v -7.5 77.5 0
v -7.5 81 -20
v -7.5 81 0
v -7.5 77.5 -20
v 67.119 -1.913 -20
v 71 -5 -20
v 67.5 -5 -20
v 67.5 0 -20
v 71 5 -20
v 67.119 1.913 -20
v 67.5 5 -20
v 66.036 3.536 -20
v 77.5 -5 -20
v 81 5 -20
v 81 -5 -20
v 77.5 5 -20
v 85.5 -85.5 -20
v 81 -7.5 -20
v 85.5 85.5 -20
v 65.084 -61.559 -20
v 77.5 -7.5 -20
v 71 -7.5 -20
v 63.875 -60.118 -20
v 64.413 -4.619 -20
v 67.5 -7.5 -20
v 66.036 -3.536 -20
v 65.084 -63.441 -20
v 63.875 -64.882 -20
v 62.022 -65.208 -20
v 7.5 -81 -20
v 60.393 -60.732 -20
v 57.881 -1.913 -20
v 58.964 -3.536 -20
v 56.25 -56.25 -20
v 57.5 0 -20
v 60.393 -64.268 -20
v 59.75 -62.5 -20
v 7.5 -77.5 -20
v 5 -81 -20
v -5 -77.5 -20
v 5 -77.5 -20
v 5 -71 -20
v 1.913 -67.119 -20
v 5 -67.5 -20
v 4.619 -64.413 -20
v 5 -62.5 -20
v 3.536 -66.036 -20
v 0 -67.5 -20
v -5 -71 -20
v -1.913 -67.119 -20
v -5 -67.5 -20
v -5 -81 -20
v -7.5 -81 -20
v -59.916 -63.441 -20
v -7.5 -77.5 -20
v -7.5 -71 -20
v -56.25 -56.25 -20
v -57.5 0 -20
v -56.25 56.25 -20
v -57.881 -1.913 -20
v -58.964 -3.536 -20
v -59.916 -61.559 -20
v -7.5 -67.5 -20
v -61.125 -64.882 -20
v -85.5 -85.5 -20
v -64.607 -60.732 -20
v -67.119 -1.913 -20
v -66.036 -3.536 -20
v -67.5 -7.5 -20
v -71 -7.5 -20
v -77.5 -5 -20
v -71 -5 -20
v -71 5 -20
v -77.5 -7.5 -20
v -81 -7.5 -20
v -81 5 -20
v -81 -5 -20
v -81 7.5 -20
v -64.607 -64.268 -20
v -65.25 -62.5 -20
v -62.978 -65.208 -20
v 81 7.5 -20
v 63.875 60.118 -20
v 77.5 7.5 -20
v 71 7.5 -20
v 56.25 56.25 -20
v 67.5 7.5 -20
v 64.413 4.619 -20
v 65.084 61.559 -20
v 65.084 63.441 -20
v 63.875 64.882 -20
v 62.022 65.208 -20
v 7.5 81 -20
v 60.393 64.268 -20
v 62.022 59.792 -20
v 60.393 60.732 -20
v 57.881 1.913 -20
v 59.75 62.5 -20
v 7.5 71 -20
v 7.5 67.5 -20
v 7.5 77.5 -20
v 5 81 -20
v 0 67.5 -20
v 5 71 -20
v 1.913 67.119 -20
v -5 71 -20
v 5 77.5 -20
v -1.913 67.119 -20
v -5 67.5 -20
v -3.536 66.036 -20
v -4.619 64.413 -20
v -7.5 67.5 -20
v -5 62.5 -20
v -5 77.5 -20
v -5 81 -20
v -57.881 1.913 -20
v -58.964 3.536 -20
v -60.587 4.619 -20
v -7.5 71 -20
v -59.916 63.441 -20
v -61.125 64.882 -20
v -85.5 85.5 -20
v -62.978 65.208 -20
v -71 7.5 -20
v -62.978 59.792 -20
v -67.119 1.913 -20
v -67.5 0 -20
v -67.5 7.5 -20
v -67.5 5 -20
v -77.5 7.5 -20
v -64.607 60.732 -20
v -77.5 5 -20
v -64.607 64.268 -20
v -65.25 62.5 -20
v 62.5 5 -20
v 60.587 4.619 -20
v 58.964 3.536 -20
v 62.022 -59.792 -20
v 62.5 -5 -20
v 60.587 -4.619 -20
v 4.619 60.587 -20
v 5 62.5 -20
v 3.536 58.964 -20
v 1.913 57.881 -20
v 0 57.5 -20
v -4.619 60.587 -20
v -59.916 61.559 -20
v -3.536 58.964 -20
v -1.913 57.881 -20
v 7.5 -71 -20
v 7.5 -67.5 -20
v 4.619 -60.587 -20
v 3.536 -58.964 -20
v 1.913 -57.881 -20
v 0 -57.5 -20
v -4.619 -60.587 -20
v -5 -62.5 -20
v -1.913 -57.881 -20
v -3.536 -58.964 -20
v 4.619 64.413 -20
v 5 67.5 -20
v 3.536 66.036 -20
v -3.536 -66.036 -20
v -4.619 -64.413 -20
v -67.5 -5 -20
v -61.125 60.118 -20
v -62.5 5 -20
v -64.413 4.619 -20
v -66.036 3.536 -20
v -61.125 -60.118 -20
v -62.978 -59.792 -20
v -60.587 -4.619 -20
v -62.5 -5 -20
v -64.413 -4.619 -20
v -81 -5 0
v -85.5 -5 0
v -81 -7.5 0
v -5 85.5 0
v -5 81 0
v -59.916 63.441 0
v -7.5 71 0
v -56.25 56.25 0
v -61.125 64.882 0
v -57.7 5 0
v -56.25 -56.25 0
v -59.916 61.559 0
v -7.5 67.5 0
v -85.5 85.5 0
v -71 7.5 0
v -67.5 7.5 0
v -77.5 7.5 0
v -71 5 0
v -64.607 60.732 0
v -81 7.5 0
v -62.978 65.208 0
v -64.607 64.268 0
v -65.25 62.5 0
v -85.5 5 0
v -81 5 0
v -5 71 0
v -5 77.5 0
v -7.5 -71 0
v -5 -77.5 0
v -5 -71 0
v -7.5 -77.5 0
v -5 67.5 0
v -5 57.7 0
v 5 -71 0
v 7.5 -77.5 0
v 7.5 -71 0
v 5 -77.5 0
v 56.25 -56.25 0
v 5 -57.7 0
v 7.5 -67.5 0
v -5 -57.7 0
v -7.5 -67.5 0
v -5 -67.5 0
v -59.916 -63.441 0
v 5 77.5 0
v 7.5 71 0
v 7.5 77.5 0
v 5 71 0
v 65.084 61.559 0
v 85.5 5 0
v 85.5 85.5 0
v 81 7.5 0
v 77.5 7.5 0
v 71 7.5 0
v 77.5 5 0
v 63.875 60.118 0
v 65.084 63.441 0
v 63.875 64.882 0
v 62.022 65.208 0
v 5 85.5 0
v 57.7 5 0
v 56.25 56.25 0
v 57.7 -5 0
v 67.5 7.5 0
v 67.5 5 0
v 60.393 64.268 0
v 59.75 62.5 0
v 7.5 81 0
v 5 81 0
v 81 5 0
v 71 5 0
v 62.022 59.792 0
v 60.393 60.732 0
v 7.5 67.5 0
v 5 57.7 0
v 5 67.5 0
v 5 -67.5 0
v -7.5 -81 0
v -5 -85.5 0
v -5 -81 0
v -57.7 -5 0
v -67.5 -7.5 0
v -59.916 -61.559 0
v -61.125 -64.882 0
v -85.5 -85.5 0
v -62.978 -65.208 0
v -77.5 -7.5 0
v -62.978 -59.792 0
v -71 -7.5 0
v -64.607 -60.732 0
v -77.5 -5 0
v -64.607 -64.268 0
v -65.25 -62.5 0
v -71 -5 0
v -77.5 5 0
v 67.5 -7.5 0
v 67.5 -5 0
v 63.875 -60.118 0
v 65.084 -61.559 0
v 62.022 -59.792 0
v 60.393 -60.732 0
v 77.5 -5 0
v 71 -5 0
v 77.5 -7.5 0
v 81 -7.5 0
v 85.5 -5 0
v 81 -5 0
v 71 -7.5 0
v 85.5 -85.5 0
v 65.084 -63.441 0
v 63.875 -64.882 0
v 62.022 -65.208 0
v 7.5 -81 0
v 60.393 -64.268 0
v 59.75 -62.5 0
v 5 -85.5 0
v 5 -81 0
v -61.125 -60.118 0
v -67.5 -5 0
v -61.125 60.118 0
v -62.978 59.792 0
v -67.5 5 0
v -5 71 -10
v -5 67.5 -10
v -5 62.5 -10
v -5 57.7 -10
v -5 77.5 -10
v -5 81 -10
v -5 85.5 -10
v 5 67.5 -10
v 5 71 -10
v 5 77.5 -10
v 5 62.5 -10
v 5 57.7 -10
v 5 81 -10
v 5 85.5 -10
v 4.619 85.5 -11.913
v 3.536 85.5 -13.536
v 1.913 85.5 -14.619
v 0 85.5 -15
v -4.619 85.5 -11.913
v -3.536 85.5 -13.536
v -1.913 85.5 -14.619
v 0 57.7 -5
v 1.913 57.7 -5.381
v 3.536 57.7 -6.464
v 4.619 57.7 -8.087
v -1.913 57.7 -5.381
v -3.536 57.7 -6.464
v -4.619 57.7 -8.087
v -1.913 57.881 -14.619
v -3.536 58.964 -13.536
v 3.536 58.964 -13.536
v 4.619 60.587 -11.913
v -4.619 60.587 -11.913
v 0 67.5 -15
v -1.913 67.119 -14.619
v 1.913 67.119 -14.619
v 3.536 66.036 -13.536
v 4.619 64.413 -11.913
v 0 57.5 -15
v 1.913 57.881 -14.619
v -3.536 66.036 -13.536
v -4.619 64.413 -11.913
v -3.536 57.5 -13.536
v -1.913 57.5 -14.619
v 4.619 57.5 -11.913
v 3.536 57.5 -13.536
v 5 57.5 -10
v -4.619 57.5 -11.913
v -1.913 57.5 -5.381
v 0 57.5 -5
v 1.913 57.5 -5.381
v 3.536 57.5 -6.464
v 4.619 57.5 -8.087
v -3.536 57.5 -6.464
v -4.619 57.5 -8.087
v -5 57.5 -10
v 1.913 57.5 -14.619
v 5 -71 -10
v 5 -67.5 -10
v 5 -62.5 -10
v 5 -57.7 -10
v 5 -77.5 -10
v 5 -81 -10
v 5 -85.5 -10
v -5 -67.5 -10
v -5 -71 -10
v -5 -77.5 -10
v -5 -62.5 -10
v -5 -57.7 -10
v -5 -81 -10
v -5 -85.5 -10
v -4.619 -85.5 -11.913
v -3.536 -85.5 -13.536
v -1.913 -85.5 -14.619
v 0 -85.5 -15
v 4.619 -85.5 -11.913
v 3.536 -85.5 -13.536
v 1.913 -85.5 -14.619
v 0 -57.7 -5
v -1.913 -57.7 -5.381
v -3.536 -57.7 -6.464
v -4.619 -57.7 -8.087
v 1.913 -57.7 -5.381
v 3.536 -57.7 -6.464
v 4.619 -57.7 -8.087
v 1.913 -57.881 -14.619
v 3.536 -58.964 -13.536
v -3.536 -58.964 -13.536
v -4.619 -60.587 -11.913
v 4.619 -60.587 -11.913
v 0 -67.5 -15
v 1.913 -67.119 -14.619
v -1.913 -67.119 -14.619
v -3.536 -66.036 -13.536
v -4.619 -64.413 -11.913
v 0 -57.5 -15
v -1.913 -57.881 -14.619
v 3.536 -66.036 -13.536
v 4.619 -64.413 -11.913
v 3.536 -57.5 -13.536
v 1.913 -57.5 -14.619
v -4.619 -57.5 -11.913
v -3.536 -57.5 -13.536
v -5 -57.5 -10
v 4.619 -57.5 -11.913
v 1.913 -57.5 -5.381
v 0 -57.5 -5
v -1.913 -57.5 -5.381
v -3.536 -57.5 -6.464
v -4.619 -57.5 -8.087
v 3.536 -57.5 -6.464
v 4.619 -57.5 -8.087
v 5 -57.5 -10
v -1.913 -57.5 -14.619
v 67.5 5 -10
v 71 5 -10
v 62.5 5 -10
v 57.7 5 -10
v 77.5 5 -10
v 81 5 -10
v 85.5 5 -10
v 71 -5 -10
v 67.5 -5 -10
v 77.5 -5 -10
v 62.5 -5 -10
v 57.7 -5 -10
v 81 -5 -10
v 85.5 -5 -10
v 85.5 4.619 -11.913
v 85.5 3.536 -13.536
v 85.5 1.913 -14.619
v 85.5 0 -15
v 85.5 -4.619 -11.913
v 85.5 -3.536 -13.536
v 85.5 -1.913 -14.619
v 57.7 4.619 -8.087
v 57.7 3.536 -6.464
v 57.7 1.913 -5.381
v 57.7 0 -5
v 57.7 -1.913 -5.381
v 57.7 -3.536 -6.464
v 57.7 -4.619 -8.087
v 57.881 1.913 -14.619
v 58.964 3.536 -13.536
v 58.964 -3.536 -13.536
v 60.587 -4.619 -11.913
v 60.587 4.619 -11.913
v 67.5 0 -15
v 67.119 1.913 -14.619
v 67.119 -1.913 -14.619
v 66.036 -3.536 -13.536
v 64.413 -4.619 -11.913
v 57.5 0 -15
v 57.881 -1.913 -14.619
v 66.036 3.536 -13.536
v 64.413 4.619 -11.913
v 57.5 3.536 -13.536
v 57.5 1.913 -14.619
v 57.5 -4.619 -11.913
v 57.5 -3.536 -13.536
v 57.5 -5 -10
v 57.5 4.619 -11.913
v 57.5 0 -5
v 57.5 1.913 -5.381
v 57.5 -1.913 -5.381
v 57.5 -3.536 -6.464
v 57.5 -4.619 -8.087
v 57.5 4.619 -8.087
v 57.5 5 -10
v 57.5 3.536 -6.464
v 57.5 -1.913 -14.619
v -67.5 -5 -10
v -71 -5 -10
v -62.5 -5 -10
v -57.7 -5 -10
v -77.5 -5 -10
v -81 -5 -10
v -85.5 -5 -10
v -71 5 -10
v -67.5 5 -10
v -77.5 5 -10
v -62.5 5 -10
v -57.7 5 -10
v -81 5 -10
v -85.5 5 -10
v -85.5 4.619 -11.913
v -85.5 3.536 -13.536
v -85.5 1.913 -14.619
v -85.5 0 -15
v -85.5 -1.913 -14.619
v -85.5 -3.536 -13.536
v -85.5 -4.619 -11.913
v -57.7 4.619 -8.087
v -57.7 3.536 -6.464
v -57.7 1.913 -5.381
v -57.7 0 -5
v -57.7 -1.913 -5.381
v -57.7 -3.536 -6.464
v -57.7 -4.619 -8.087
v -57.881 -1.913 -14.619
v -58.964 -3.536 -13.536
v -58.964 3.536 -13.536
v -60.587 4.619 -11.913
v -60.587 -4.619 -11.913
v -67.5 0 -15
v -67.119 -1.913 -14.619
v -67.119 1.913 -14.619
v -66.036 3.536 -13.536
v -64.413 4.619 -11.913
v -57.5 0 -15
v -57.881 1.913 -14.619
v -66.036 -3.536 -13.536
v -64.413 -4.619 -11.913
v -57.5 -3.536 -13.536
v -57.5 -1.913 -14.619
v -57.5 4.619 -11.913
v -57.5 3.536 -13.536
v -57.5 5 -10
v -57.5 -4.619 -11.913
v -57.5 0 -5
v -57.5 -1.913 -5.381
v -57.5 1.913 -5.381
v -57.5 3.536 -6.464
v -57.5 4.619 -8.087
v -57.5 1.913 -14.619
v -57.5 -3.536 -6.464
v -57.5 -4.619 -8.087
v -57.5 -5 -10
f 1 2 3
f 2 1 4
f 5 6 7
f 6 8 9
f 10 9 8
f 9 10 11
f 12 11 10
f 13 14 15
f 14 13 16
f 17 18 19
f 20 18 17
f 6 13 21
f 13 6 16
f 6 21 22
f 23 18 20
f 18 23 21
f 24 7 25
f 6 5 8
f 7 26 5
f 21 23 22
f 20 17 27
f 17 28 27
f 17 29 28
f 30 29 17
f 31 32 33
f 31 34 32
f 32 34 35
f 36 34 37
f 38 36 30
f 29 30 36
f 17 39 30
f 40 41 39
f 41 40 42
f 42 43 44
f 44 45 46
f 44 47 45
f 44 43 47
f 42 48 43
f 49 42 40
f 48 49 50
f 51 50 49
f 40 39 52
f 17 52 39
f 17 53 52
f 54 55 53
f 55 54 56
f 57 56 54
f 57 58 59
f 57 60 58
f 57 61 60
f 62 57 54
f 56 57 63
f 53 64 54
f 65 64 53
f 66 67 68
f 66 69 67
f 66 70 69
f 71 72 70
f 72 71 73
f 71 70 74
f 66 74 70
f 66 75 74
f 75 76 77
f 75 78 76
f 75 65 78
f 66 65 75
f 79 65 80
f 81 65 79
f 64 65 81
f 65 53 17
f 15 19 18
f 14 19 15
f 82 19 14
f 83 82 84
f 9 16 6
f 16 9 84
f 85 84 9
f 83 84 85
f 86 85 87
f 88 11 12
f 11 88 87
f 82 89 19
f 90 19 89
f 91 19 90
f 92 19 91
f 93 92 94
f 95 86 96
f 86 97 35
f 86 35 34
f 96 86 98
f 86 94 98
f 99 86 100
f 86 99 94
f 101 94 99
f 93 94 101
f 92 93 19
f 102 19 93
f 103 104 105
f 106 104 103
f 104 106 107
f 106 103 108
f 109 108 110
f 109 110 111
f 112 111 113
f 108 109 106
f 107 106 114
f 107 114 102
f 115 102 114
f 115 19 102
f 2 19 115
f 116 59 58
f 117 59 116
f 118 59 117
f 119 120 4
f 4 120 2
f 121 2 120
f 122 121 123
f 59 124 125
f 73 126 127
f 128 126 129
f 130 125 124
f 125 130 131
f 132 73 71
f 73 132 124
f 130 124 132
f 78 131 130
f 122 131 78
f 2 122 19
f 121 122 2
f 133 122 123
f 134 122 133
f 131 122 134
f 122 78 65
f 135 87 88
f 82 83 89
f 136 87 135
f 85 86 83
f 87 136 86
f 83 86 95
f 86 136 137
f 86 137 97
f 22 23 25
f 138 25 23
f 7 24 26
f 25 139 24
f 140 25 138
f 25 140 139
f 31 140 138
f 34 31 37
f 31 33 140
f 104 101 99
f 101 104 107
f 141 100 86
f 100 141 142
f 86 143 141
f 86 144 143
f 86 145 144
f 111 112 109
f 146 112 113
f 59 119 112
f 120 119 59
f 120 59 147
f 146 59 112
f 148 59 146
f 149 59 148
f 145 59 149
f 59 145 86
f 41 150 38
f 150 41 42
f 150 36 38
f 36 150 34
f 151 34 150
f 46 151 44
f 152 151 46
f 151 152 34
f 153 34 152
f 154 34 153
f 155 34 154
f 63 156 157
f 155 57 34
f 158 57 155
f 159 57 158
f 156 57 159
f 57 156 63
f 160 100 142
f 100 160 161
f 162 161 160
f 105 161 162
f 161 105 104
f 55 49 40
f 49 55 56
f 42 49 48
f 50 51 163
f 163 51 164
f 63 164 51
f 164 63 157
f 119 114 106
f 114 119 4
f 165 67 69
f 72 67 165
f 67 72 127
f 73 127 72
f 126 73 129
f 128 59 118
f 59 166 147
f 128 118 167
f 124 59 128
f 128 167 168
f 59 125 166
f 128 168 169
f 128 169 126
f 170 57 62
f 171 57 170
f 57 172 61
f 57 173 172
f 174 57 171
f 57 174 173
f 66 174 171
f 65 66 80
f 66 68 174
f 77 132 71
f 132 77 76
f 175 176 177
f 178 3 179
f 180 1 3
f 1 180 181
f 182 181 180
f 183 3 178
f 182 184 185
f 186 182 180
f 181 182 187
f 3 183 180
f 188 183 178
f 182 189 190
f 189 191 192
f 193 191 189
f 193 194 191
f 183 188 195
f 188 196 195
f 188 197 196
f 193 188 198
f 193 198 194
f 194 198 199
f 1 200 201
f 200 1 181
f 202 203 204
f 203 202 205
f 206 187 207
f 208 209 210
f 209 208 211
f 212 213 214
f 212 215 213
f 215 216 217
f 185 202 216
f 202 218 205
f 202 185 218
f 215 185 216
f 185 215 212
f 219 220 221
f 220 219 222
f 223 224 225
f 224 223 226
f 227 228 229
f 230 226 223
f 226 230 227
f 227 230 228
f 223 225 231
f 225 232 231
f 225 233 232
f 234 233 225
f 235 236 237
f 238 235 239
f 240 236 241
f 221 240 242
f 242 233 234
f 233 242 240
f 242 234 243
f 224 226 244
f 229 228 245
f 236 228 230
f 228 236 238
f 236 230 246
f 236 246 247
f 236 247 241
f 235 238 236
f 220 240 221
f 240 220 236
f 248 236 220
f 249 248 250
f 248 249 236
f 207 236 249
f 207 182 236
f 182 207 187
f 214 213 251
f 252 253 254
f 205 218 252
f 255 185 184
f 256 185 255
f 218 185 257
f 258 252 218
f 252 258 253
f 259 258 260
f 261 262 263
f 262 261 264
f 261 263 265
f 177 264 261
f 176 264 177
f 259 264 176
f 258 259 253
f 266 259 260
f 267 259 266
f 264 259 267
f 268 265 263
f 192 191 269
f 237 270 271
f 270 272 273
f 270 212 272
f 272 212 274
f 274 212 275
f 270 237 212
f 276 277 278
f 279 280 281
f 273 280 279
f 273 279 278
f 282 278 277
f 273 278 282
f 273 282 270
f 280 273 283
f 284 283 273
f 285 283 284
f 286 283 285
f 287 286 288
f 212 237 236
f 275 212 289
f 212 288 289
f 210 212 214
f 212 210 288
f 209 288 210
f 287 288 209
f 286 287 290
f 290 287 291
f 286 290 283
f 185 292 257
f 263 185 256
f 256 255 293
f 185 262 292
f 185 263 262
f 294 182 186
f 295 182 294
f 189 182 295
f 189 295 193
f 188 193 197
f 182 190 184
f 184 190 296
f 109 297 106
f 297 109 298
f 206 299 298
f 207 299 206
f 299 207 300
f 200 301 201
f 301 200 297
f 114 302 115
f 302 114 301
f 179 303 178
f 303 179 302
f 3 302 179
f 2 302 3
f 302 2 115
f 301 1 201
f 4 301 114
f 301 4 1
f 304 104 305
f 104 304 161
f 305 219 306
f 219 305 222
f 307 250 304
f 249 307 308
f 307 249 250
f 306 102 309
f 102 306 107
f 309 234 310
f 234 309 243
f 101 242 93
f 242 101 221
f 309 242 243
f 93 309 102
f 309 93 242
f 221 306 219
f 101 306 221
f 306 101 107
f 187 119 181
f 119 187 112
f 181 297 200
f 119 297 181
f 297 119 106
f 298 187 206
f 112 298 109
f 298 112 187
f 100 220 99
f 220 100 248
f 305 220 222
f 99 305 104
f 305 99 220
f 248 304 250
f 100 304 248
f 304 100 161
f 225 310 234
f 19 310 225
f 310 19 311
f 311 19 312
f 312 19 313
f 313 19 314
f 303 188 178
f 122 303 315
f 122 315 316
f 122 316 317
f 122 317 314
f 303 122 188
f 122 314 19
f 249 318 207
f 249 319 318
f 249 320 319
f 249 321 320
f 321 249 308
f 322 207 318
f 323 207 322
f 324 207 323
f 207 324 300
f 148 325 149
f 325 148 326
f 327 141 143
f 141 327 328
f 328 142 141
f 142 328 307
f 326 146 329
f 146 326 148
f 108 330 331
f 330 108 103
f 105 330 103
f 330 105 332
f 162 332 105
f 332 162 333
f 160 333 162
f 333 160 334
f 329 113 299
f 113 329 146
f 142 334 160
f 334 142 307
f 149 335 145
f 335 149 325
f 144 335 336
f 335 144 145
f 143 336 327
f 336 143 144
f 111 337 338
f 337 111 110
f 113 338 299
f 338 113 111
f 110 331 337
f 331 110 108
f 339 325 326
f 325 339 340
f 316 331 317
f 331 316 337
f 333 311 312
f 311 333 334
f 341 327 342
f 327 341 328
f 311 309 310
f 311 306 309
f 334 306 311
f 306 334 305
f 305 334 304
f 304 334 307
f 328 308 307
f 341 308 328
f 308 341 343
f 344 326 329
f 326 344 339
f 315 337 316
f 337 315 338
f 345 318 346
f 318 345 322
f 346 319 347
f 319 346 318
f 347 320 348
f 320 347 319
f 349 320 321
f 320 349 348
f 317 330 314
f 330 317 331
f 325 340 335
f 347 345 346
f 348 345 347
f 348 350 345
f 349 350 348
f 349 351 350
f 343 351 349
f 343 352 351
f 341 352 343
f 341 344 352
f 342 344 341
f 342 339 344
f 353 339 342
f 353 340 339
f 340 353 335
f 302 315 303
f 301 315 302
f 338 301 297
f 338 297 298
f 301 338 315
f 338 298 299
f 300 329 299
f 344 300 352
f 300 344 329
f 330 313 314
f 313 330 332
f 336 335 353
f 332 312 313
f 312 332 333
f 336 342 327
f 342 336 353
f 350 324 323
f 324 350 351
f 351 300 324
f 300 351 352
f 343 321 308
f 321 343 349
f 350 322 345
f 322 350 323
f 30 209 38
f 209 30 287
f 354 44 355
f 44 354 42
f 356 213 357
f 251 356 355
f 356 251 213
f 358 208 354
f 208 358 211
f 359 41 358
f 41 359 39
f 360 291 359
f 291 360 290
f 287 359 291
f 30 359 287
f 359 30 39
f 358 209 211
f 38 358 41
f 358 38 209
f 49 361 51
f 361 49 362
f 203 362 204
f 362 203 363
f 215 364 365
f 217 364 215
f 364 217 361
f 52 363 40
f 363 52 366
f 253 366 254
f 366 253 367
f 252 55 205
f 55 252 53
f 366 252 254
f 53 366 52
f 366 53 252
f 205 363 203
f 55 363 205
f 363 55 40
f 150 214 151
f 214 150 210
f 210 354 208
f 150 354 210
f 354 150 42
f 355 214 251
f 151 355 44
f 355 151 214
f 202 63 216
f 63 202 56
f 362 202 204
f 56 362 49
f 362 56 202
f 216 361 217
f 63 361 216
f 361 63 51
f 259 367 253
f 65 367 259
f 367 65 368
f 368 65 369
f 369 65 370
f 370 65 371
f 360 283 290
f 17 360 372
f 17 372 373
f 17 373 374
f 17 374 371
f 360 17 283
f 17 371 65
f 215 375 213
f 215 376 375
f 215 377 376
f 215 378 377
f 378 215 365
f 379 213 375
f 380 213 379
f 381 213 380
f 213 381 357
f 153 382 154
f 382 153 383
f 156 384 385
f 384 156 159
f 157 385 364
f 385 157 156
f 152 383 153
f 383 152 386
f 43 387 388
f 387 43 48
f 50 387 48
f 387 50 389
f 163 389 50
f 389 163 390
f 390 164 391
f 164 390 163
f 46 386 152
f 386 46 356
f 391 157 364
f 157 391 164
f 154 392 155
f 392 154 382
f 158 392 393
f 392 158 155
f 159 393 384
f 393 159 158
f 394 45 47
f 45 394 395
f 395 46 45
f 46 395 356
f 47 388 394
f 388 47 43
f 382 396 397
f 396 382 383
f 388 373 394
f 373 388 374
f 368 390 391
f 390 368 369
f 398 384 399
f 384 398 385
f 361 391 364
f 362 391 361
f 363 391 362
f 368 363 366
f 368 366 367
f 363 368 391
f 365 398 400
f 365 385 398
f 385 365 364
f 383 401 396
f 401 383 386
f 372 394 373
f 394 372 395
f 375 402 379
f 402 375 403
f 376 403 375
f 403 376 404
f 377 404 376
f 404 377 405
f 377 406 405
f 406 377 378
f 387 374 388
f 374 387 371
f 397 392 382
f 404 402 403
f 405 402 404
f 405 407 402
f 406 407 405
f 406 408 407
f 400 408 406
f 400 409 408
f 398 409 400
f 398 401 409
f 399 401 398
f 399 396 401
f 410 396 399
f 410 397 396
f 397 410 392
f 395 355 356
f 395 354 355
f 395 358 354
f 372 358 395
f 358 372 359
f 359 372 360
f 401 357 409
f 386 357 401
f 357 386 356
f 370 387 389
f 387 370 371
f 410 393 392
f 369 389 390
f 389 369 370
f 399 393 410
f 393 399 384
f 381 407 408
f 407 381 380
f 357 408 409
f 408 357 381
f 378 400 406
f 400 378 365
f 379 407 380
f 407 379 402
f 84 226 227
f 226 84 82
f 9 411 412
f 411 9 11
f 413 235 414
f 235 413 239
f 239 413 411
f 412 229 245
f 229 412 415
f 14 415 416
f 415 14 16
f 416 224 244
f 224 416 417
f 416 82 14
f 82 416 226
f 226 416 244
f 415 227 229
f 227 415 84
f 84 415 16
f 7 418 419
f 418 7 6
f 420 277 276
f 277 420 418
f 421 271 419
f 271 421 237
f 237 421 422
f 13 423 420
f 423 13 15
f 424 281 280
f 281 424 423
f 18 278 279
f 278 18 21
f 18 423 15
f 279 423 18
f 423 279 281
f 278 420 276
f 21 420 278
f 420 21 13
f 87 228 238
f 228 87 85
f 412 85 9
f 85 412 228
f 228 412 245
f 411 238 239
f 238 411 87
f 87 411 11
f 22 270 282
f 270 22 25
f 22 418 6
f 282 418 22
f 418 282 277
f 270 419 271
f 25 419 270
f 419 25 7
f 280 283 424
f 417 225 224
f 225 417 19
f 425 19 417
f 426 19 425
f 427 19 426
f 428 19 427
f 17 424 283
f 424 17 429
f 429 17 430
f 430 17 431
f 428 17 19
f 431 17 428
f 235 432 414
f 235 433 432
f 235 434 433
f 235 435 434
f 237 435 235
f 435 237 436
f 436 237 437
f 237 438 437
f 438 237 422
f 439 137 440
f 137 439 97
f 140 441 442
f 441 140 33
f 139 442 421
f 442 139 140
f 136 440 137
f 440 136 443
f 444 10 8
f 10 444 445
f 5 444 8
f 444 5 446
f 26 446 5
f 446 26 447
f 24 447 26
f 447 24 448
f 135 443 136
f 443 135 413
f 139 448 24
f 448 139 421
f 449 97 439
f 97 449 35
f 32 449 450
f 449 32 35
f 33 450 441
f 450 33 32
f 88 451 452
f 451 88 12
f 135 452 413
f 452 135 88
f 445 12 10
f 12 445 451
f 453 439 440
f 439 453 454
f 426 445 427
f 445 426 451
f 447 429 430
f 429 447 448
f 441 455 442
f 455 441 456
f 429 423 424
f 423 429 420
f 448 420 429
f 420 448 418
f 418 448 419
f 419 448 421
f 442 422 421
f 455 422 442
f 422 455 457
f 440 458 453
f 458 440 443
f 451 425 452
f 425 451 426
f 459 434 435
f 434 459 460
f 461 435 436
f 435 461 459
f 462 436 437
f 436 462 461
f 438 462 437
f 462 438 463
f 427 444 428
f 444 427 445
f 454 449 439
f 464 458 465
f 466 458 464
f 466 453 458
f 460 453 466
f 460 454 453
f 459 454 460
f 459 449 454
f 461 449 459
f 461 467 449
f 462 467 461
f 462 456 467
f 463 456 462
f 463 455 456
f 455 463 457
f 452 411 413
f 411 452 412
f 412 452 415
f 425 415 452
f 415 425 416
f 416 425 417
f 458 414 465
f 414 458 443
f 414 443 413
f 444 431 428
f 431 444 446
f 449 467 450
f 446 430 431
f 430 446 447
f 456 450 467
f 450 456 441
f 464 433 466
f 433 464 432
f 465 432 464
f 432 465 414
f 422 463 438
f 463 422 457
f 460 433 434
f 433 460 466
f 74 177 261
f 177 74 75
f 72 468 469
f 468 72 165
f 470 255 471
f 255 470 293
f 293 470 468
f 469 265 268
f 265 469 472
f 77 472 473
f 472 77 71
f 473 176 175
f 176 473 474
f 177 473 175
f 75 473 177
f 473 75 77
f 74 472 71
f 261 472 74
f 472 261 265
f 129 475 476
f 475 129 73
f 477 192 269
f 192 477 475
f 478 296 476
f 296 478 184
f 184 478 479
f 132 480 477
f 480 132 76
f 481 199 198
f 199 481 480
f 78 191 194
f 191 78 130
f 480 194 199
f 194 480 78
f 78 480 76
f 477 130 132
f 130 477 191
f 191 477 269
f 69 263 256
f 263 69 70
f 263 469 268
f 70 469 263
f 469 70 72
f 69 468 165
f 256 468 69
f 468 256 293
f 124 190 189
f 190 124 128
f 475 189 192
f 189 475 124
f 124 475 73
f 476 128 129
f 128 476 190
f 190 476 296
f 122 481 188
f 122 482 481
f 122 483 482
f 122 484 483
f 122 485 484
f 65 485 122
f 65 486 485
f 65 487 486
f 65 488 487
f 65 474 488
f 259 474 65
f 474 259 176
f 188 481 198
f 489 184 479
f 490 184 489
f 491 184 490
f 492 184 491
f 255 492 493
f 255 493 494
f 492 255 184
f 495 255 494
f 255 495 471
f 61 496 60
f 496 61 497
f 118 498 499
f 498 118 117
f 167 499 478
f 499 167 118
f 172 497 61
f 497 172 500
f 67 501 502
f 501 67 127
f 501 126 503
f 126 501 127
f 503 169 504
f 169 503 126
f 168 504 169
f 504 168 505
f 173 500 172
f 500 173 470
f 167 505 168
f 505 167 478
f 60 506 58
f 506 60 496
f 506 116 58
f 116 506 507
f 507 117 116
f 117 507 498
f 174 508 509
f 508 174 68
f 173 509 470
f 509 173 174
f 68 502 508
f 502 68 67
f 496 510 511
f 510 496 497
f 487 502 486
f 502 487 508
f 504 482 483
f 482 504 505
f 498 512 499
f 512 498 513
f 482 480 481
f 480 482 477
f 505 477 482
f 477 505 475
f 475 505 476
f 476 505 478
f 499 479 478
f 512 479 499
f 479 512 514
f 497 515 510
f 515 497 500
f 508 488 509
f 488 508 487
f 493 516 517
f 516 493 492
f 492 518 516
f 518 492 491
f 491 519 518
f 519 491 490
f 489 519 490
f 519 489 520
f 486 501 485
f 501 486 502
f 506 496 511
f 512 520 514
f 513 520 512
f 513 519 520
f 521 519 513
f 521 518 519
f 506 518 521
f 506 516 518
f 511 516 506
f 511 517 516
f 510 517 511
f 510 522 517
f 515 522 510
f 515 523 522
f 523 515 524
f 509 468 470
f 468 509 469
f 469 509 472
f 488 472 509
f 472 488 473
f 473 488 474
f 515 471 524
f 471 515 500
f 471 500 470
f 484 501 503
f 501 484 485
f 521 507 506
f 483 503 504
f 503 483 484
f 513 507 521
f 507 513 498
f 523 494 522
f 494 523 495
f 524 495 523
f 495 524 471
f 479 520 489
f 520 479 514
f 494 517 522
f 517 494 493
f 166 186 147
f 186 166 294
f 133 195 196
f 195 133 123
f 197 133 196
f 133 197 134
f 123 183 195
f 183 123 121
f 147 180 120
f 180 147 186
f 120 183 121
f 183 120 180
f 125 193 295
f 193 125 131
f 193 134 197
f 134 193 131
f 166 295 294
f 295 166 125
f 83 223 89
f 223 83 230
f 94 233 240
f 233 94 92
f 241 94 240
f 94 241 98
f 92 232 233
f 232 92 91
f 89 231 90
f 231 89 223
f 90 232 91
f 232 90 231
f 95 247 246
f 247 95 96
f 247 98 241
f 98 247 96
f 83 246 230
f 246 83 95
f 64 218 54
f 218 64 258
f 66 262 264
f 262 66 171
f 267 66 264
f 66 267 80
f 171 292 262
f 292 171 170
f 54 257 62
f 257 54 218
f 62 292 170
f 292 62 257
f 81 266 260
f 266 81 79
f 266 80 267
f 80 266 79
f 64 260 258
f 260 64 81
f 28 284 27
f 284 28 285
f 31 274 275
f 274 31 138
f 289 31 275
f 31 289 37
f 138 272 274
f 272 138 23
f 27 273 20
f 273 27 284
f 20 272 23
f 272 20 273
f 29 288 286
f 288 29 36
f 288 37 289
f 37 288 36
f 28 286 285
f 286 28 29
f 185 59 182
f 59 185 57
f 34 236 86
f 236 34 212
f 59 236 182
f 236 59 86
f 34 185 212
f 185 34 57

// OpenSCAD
wave_length=125;
antenna_width=10;
antenna_base_length=23;

base_width=wave_length+2*antenna_base_length;
height=antenna_width*2;

ziptie_width=3.5;
ziptie_depth=2.5;

screw_r=5.5/2;

module antenna() {
    //antenna cutout below
    lip=0.2;
    translate([antenna_width/2,antenna_width/2-lip,-antenna_width]) rotate([0,0,180]) cube([antenna_width,antenna_base_length+antenna_width/2-lip,antenna_width]);
    
    //the base antenna
    cylinder(height*4,antenna_width/2,antenna_width/2);
    translate([0,antenna_width/2,0]) rotate([90,0,0]) {
        cylinder(antenna_base_length+antenna_width/2,antenna_width/2,antenna_width/2);
    }
    //a ziptie
    rotate([0,0,180]) translate([antenna_width/2,antenna_width/2,-antenna_width]) {
        
        cube([ziptie_depth,ziptie_width,height]);
        translate([-antenna_width-ziptie_depth,0,0]) cube([ziptie_depth,ziptie_width,height]);
        translate([0,10,0]) {
            cube([ziptie_depth,ziptie_width,height]);
            translate([-antenna_width-ziptie_depth,0,0]) cube([ziptie_depth,ziptie_width,height]);
        }
    }
}

rotate([0,180,0]) difference() 
{
    translate([-base_width/2,-base_width/2,0]) cube([base_width,base_width,height]);
    translate([0,0,height/2]) {
        translate([0,wave_length/2,0]) rotate([0,0,180]) antenna();
        translate([0,-wave_length/2,0]) antenna();
        rotate([0,0,90]) {
            translate([0,wave_length/2,0]) rotate([0,0,180]) antenna();
            translate([0,-wave_length/2,0]) antenna();
        }
    }
    
    
    translate([wave_length/2,wave_length/2,0]) cylinder(height,screw_r,screw_r);
    translate([-wave_length/2,wave_length/2,0]) cylinder(height,screw_r,screw_r);
    translate([wave_length/2,-wave_length/2,0]) cylinder(height,screw_r,screw_r);
    translate([-wave_length/2,-wave_length/2,0]) cylinder(height,screw_r,screw_r);
    z=wave_length*0.9;
    translate([-z/2,-z/2]) cube([z,z,height*2]);
}
//cube([10,20,height]);
